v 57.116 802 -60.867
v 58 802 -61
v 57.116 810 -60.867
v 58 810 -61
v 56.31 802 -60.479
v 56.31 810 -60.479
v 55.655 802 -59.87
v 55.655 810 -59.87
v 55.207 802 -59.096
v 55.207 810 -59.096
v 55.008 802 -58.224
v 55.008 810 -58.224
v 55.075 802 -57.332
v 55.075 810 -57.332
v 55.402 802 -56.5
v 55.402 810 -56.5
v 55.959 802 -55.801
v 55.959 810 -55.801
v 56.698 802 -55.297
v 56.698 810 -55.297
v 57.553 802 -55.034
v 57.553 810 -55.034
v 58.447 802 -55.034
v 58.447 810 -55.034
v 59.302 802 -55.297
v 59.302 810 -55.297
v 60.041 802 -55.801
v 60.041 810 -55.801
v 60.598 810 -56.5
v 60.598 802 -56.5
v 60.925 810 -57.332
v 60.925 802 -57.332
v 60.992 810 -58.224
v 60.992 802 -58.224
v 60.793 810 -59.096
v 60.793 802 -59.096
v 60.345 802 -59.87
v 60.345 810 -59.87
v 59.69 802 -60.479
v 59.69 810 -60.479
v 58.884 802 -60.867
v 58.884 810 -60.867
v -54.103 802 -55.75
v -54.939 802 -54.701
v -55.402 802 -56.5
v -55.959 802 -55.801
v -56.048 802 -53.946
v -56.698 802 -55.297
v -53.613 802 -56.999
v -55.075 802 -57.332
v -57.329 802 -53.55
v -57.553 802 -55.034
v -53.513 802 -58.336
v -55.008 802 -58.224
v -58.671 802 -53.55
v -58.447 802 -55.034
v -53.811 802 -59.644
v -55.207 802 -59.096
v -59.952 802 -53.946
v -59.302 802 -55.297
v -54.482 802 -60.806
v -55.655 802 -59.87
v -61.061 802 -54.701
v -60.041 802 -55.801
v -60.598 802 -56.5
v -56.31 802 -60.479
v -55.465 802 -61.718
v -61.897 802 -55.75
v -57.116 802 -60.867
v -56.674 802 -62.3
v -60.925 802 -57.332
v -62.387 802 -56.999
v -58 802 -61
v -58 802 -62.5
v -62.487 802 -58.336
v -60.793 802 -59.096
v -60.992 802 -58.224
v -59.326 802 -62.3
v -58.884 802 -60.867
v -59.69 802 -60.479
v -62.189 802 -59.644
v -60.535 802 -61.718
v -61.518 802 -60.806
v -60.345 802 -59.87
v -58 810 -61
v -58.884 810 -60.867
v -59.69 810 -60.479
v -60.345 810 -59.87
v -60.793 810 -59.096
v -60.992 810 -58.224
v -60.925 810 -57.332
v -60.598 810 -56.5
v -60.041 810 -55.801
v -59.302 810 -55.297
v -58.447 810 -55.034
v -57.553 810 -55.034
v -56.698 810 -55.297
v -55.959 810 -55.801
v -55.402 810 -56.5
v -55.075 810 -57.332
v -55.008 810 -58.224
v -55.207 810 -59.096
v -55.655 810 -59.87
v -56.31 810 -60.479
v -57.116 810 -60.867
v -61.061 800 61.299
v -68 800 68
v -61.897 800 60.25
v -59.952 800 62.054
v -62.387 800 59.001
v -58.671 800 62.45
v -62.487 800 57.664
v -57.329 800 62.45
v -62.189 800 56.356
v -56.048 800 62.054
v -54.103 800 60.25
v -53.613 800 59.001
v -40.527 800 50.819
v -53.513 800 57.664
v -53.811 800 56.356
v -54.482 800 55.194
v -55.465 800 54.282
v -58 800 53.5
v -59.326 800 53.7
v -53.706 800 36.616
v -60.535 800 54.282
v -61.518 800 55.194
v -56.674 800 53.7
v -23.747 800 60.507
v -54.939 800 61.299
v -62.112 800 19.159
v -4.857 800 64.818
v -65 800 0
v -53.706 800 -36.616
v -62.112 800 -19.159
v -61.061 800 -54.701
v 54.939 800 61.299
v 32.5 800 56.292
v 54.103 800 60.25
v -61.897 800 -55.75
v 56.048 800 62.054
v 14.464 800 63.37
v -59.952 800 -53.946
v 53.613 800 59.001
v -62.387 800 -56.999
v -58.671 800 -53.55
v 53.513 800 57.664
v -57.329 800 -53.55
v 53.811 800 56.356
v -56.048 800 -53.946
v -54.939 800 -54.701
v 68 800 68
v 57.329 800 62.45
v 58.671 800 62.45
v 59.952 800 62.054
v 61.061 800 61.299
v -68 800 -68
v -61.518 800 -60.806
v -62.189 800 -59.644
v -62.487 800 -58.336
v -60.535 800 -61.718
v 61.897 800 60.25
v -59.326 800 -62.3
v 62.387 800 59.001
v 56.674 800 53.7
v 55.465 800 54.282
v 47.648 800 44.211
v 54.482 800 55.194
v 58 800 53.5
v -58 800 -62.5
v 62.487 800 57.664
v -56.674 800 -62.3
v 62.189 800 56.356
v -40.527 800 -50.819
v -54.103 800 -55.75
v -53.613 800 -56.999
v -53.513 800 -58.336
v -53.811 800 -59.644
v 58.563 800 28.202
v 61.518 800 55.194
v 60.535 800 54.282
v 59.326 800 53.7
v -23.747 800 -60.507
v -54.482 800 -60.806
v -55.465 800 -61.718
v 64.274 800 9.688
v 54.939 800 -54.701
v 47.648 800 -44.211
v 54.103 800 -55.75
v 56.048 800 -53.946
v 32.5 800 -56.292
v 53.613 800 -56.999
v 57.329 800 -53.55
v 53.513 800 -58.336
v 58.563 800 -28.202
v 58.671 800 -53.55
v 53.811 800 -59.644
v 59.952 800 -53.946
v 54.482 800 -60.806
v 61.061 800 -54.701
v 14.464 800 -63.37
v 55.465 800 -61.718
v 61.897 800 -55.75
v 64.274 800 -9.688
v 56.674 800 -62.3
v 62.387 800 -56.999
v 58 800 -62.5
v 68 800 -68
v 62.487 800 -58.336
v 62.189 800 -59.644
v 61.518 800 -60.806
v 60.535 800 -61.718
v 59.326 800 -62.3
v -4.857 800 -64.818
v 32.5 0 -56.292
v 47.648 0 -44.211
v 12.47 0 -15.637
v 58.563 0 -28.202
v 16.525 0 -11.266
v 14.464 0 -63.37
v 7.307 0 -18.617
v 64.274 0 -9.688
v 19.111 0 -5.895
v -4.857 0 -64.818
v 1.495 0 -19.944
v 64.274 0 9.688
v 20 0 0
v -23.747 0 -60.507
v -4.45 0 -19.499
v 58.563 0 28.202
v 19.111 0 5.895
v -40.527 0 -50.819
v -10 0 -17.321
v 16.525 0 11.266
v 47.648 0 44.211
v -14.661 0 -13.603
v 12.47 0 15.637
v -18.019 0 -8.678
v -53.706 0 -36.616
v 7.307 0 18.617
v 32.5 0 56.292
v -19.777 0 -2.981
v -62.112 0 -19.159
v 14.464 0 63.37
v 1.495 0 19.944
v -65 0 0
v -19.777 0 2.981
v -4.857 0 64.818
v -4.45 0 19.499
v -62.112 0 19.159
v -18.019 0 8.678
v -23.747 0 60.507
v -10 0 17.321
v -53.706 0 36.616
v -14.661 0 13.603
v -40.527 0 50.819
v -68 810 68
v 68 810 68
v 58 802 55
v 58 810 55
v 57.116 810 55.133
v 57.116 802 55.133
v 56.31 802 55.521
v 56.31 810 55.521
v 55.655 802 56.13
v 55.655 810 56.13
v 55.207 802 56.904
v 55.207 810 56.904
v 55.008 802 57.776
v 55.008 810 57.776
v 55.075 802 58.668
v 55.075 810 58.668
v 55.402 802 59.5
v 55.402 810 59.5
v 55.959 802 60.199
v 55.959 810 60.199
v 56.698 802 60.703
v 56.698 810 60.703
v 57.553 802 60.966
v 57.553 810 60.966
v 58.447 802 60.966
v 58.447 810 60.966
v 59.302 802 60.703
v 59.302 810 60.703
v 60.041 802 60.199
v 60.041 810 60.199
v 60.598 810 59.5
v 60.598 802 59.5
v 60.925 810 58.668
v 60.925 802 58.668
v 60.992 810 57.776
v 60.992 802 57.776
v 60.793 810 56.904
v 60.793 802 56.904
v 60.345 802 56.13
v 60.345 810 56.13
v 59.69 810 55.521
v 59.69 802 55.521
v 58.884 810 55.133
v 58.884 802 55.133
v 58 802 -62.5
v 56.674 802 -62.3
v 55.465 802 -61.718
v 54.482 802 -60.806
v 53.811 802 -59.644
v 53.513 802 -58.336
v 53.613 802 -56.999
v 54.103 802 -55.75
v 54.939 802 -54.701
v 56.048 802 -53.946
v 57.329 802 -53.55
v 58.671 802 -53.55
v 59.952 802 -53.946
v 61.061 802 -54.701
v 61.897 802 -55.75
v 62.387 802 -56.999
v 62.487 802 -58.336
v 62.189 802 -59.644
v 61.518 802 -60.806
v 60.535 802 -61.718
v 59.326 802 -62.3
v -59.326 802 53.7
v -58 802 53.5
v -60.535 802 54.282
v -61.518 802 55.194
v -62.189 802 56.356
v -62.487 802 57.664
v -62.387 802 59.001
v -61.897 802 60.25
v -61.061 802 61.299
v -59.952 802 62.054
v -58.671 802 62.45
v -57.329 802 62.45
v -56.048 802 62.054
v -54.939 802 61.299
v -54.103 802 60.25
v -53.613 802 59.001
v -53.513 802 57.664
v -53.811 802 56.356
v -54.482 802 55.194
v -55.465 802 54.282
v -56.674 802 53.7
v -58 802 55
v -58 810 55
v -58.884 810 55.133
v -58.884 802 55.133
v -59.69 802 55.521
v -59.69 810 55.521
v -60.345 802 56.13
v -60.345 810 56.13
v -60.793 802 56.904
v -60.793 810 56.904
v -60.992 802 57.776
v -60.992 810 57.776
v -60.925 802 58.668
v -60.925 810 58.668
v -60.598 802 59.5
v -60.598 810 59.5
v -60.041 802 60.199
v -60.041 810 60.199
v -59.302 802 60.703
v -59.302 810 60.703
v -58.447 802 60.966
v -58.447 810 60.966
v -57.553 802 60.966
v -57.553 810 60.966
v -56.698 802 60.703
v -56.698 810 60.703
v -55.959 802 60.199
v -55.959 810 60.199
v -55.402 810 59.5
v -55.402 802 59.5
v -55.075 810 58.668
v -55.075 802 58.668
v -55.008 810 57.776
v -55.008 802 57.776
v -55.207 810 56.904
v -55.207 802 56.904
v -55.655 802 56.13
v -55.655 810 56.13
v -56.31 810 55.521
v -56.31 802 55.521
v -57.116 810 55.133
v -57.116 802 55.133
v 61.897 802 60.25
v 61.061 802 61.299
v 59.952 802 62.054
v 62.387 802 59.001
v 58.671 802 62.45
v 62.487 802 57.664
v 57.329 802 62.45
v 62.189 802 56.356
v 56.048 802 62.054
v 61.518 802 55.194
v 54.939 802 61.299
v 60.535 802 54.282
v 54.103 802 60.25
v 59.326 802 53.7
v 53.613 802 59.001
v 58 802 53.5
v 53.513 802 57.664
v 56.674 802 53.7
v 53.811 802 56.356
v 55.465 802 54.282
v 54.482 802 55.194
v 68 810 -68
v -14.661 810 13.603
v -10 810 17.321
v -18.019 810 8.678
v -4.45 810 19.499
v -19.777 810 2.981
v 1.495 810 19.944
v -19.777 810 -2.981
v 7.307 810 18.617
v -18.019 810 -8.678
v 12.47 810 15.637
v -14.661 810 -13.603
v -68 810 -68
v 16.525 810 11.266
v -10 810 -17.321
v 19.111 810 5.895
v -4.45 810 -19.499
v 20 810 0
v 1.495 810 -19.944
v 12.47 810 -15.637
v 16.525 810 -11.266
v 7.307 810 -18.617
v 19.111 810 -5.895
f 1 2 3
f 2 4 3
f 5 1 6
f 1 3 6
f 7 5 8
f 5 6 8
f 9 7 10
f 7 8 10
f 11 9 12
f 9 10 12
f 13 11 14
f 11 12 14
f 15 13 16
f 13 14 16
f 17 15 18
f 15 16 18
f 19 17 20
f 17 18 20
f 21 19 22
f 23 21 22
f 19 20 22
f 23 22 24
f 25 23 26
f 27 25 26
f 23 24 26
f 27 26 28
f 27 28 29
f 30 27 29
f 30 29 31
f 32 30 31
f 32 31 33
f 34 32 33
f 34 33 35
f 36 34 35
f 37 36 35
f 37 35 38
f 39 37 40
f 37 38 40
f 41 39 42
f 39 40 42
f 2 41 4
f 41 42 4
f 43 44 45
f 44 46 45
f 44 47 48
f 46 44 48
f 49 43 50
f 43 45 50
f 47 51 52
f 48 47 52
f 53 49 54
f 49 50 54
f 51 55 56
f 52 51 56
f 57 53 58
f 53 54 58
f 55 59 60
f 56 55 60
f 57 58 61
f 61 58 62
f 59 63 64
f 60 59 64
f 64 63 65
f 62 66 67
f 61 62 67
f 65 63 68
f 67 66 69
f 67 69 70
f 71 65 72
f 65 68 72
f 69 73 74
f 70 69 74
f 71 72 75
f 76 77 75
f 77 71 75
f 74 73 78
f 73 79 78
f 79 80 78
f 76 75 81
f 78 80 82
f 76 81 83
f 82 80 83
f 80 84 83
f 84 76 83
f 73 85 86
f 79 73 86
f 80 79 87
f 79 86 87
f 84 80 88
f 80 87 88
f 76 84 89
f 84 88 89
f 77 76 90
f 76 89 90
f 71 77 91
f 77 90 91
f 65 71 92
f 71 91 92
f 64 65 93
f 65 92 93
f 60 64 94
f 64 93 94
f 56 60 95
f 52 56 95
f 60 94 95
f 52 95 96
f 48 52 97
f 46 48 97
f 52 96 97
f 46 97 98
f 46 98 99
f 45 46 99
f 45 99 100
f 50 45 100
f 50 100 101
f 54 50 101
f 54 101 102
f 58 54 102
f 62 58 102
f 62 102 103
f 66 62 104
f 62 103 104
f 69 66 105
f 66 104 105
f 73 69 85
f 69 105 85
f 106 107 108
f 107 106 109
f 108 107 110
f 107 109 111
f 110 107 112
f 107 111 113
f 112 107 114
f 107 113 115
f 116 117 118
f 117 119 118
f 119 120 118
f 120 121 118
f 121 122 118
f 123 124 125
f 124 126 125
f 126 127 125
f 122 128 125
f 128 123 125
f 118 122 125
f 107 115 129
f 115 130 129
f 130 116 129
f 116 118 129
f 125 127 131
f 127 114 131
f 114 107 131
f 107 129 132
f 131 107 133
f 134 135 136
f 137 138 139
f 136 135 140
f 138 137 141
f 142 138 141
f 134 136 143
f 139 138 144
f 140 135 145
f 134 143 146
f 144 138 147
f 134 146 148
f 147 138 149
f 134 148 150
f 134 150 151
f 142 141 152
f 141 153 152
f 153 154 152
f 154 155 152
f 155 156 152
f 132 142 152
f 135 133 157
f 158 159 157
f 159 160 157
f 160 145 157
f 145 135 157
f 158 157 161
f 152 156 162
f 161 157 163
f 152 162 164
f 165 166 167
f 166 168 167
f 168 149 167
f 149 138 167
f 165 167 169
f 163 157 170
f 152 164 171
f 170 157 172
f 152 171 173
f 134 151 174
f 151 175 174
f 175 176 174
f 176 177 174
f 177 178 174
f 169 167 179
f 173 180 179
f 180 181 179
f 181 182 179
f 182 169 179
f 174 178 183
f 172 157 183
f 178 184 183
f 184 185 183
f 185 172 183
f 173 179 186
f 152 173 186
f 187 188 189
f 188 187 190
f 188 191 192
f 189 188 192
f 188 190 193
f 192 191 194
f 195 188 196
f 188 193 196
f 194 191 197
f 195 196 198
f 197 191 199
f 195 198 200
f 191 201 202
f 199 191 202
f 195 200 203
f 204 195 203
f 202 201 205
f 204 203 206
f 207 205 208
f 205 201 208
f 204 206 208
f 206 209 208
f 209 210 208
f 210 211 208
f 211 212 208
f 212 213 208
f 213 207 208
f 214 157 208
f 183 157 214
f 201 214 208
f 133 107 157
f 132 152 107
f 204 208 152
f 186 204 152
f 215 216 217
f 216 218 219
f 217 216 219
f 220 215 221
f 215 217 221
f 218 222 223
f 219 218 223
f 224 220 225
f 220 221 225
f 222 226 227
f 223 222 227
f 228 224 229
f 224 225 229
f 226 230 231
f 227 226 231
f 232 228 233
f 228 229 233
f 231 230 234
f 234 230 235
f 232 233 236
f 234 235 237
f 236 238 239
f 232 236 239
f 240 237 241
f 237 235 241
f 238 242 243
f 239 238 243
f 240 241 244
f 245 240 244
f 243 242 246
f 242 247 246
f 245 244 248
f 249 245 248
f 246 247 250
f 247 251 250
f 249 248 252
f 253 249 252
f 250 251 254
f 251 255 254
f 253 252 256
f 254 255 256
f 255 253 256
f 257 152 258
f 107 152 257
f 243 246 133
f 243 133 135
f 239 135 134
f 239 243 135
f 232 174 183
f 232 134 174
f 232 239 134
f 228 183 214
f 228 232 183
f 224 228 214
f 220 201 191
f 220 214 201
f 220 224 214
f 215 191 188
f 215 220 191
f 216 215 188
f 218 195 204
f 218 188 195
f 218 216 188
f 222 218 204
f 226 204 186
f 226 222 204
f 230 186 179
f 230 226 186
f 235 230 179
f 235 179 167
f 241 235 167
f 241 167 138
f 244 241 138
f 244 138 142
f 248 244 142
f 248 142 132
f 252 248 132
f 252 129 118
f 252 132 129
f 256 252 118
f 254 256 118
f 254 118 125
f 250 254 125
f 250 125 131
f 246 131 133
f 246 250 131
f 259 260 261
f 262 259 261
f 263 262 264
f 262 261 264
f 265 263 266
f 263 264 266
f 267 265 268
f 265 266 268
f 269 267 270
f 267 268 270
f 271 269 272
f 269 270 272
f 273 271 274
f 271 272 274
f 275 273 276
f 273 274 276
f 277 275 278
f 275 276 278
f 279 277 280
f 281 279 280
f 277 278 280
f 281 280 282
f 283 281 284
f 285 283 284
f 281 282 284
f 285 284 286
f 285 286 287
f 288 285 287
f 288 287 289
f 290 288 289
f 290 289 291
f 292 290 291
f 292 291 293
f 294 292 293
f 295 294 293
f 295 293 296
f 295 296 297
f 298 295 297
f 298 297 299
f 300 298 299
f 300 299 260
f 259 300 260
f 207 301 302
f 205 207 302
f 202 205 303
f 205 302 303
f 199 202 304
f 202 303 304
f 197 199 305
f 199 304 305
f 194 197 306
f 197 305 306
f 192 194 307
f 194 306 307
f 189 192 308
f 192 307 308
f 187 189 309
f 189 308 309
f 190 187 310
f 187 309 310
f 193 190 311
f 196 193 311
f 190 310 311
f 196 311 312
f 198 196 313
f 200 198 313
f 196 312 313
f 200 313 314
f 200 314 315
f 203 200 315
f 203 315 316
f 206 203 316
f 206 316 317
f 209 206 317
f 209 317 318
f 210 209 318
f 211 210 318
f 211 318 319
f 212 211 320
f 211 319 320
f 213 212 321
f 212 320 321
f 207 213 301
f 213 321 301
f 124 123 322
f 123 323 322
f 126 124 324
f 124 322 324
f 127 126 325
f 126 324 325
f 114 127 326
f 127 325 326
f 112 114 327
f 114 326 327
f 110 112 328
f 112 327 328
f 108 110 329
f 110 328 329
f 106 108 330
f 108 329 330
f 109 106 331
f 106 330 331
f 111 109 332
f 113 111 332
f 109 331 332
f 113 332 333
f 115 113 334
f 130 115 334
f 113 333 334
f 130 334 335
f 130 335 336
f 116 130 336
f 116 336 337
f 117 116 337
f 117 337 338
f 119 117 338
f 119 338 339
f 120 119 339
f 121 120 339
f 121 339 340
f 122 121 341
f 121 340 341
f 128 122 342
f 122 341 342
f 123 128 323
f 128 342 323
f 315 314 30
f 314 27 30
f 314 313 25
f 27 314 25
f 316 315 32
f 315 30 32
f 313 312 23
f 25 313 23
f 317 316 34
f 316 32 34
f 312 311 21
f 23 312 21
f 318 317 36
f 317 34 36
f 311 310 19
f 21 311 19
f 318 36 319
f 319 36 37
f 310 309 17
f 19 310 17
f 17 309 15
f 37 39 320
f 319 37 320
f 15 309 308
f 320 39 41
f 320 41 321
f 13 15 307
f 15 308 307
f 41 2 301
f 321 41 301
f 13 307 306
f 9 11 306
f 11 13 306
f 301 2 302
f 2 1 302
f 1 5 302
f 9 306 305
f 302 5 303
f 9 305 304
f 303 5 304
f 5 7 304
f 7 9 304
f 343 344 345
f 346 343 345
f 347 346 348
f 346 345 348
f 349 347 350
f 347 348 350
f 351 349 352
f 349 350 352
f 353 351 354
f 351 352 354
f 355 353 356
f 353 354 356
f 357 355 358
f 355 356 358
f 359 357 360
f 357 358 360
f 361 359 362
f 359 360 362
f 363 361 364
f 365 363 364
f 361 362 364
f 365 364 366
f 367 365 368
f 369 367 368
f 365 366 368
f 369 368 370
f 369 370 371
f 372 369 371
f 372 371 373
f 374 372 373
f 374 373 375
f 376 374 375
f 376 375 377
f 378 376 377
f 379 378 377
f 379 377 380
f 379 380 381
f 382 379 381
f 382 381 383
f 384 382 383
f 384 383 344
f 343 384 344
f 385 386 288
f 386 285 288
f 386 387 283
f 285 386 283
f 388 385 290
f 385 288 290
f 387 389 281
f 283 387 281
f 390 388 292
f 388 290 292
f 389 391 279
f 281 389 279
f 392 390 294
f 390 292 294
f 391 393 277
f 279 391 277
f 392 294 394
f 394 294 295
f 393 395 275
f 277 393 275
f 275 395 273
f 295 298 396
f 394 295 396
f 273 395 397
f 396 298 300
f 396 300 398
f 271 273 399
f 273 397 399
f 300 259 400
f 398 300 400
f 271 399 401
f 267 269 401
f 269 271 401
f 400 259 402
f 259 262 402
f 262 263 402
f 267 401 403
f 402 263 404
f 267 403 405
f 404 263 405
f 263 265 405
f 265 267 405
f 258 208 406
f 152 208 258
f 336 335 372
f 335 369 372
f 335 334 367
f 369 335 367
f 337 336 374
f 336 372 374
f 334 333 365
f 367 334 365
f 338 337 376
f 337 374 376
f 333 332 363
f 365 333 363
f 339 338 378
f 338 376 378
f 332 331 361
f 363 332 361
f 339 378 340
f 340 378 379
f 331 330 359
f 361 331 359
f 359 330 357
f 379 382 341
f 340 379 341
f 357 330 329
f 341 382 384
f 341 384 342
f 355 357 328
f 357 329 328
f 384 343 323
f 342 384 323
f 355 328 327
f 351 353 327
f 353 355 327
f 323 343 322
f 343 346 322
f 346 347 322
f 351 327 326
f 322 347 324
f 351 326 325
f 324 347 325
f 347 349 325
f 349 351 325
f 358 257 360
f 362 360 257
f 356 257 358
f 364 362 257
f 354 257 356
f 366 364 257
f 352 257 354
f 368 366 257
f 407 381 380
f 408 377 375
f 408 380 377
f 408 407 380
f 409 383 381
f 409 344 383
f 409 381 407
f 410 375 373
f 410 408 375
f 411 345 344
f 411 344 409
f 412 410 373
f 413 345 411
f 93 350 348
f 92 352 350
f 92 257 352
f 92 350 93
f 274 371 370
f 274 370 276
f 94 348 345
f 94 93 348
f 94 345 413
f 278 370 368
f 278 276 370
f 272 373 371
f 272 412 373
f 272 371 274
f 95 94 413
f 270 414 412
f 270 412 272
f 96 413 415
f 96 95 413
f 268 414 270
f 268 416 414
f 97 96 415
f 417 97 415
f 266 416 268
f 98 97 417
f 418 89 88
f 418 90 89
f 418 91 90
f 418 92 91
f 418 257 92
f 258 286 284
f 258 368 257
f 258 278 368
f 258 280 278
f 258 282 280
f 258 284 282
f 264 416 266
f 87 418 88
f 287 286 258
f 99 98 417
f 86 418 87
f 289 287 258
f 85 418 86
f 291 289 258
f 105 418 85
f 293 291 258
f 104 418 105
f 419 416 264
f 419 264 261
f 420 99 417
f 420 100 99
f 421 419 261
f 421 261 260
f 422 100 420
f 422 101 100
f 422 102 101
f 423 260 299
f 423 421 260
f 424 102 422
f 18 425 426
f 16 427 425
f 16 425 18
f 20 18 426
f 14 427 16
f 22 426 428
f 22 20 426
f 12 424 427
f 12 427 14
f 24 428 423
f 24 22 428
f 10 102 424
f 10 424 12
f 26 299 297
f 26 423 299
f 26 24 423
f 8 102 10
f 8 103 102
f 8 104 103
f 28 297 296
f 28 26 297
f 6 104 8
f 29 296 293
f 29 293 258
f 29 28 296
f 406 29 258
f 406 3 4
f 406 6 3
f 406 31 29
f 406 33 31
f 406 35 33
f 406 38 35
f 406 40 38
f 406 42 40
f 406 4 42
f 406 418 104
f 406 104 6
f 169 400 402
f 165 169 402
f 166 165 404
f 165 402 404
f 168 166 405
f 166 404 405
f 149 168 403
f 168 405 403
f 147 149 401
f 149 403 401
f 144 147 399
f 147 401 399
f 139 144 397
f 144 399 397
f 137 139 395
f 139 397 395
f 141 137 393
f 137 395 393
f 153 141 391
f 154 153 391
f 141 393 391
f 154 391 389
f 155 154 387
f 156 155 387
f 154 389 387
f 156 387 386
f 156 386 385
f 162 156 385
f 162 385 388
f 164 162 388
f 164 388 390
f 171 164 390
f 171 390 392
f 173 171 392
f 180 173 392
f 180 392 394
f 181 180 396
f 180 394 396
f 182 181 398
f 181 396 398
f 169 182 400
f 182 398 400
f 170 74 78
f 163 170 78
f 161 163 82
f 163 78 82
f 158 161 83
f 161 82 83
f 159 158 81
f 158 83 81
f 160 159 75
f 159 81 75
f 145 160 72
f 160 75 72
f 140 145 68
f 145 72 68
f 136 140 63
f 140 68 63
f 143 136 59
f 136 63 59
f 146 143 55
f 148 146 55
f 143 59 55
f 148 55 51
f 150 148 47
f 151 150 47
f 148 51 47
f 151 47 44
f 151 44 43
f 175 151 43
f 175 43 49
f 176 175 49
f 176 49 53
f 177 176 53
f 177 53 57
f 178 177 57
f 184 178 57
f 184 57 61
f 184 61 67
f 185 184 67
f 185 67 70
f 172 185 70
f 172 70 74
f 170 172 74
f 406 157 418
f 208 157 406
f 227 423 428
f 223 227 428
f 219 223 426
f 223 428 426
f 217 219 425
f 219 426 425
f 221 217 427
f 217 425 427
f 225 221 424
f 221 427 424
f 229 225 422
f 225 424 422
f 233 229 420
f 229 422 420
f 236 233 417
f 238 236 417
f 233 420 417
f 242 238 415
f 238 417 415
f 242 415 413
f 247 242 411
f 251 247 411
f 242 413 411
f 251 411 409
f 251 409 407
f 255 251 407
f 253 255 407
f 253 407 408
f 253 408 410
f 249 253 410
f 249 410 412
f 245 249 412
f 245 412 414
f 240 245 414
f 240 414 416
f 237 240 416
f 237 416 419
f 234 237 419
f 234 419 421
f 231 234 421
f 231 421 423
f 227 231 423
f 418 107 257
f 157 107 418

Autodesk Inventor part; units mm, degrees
ref_plane "YZ Plane" through (0, 0, 0) normal (1, 0, 0) x (0, 1, 0)
ref_plane "XZ Plane" through (0, 0, 0) normal (0, 1, 0) x (-1, 0, 0)
sketch "Sketch1" plane through (0, 0, 0) normal (0, 1, 0) x (-1, 0, 0)
  circle A0 centre (0, 0) radius 65
  dimension "d0" = 130
extrude "Beam" add sketch "Sketch1" along normal blind 800
ref_plane "Work Plane1" through (0, 800, 0) normal (0, 1, 0) x (1, 0, 0)
sketch "Sketch2" plane through (0, 800, 0) normal (0, 1, 0) x (1, 0, 0)
  line L0 (-68, 68) -> (68, 68)
  line L1 (68, 68) -> (68, -68)
  line L2 (68, -68) -> (-68, -68)
  line L3 (-68, -68) -> (-68, 68)
  line L4 (-68, 68) -> (68, -68) construction
  line L5 (68, 68) -> (-68, -68) construction
  point P0 (0, 0)
extrude "Connector" add sketch "Sketch2" along normal blind 10
sketch "Sketch6" plane through (0, 810, 0) normal (0, 1, 0) x (1, 0, 0)
  circle A0 centre (0, 0) radius 20
extrude "CableHole" cut sketch "Sketch6" against normal up to next
sketch "Sketch8" plane through (0, 800, 0) normal (0, -1, 0) x (1, 0, 0)
  point P0 (0, 0)
  point P1 (58, -58)
  point P2 (-58, -58)
  point P3 (-58, 58)
  point P4 (58, 58)
hole "Hole2" at (58, 800, -58) at (-58, 800, -58) at (-58, 800, 58) at (58, 800, 58) direction (0, 1, 0) diameter 6 depth 10 tip angle 118 counterbore diameter 9 counterbore depth 2
properties part number "RaAxis"
